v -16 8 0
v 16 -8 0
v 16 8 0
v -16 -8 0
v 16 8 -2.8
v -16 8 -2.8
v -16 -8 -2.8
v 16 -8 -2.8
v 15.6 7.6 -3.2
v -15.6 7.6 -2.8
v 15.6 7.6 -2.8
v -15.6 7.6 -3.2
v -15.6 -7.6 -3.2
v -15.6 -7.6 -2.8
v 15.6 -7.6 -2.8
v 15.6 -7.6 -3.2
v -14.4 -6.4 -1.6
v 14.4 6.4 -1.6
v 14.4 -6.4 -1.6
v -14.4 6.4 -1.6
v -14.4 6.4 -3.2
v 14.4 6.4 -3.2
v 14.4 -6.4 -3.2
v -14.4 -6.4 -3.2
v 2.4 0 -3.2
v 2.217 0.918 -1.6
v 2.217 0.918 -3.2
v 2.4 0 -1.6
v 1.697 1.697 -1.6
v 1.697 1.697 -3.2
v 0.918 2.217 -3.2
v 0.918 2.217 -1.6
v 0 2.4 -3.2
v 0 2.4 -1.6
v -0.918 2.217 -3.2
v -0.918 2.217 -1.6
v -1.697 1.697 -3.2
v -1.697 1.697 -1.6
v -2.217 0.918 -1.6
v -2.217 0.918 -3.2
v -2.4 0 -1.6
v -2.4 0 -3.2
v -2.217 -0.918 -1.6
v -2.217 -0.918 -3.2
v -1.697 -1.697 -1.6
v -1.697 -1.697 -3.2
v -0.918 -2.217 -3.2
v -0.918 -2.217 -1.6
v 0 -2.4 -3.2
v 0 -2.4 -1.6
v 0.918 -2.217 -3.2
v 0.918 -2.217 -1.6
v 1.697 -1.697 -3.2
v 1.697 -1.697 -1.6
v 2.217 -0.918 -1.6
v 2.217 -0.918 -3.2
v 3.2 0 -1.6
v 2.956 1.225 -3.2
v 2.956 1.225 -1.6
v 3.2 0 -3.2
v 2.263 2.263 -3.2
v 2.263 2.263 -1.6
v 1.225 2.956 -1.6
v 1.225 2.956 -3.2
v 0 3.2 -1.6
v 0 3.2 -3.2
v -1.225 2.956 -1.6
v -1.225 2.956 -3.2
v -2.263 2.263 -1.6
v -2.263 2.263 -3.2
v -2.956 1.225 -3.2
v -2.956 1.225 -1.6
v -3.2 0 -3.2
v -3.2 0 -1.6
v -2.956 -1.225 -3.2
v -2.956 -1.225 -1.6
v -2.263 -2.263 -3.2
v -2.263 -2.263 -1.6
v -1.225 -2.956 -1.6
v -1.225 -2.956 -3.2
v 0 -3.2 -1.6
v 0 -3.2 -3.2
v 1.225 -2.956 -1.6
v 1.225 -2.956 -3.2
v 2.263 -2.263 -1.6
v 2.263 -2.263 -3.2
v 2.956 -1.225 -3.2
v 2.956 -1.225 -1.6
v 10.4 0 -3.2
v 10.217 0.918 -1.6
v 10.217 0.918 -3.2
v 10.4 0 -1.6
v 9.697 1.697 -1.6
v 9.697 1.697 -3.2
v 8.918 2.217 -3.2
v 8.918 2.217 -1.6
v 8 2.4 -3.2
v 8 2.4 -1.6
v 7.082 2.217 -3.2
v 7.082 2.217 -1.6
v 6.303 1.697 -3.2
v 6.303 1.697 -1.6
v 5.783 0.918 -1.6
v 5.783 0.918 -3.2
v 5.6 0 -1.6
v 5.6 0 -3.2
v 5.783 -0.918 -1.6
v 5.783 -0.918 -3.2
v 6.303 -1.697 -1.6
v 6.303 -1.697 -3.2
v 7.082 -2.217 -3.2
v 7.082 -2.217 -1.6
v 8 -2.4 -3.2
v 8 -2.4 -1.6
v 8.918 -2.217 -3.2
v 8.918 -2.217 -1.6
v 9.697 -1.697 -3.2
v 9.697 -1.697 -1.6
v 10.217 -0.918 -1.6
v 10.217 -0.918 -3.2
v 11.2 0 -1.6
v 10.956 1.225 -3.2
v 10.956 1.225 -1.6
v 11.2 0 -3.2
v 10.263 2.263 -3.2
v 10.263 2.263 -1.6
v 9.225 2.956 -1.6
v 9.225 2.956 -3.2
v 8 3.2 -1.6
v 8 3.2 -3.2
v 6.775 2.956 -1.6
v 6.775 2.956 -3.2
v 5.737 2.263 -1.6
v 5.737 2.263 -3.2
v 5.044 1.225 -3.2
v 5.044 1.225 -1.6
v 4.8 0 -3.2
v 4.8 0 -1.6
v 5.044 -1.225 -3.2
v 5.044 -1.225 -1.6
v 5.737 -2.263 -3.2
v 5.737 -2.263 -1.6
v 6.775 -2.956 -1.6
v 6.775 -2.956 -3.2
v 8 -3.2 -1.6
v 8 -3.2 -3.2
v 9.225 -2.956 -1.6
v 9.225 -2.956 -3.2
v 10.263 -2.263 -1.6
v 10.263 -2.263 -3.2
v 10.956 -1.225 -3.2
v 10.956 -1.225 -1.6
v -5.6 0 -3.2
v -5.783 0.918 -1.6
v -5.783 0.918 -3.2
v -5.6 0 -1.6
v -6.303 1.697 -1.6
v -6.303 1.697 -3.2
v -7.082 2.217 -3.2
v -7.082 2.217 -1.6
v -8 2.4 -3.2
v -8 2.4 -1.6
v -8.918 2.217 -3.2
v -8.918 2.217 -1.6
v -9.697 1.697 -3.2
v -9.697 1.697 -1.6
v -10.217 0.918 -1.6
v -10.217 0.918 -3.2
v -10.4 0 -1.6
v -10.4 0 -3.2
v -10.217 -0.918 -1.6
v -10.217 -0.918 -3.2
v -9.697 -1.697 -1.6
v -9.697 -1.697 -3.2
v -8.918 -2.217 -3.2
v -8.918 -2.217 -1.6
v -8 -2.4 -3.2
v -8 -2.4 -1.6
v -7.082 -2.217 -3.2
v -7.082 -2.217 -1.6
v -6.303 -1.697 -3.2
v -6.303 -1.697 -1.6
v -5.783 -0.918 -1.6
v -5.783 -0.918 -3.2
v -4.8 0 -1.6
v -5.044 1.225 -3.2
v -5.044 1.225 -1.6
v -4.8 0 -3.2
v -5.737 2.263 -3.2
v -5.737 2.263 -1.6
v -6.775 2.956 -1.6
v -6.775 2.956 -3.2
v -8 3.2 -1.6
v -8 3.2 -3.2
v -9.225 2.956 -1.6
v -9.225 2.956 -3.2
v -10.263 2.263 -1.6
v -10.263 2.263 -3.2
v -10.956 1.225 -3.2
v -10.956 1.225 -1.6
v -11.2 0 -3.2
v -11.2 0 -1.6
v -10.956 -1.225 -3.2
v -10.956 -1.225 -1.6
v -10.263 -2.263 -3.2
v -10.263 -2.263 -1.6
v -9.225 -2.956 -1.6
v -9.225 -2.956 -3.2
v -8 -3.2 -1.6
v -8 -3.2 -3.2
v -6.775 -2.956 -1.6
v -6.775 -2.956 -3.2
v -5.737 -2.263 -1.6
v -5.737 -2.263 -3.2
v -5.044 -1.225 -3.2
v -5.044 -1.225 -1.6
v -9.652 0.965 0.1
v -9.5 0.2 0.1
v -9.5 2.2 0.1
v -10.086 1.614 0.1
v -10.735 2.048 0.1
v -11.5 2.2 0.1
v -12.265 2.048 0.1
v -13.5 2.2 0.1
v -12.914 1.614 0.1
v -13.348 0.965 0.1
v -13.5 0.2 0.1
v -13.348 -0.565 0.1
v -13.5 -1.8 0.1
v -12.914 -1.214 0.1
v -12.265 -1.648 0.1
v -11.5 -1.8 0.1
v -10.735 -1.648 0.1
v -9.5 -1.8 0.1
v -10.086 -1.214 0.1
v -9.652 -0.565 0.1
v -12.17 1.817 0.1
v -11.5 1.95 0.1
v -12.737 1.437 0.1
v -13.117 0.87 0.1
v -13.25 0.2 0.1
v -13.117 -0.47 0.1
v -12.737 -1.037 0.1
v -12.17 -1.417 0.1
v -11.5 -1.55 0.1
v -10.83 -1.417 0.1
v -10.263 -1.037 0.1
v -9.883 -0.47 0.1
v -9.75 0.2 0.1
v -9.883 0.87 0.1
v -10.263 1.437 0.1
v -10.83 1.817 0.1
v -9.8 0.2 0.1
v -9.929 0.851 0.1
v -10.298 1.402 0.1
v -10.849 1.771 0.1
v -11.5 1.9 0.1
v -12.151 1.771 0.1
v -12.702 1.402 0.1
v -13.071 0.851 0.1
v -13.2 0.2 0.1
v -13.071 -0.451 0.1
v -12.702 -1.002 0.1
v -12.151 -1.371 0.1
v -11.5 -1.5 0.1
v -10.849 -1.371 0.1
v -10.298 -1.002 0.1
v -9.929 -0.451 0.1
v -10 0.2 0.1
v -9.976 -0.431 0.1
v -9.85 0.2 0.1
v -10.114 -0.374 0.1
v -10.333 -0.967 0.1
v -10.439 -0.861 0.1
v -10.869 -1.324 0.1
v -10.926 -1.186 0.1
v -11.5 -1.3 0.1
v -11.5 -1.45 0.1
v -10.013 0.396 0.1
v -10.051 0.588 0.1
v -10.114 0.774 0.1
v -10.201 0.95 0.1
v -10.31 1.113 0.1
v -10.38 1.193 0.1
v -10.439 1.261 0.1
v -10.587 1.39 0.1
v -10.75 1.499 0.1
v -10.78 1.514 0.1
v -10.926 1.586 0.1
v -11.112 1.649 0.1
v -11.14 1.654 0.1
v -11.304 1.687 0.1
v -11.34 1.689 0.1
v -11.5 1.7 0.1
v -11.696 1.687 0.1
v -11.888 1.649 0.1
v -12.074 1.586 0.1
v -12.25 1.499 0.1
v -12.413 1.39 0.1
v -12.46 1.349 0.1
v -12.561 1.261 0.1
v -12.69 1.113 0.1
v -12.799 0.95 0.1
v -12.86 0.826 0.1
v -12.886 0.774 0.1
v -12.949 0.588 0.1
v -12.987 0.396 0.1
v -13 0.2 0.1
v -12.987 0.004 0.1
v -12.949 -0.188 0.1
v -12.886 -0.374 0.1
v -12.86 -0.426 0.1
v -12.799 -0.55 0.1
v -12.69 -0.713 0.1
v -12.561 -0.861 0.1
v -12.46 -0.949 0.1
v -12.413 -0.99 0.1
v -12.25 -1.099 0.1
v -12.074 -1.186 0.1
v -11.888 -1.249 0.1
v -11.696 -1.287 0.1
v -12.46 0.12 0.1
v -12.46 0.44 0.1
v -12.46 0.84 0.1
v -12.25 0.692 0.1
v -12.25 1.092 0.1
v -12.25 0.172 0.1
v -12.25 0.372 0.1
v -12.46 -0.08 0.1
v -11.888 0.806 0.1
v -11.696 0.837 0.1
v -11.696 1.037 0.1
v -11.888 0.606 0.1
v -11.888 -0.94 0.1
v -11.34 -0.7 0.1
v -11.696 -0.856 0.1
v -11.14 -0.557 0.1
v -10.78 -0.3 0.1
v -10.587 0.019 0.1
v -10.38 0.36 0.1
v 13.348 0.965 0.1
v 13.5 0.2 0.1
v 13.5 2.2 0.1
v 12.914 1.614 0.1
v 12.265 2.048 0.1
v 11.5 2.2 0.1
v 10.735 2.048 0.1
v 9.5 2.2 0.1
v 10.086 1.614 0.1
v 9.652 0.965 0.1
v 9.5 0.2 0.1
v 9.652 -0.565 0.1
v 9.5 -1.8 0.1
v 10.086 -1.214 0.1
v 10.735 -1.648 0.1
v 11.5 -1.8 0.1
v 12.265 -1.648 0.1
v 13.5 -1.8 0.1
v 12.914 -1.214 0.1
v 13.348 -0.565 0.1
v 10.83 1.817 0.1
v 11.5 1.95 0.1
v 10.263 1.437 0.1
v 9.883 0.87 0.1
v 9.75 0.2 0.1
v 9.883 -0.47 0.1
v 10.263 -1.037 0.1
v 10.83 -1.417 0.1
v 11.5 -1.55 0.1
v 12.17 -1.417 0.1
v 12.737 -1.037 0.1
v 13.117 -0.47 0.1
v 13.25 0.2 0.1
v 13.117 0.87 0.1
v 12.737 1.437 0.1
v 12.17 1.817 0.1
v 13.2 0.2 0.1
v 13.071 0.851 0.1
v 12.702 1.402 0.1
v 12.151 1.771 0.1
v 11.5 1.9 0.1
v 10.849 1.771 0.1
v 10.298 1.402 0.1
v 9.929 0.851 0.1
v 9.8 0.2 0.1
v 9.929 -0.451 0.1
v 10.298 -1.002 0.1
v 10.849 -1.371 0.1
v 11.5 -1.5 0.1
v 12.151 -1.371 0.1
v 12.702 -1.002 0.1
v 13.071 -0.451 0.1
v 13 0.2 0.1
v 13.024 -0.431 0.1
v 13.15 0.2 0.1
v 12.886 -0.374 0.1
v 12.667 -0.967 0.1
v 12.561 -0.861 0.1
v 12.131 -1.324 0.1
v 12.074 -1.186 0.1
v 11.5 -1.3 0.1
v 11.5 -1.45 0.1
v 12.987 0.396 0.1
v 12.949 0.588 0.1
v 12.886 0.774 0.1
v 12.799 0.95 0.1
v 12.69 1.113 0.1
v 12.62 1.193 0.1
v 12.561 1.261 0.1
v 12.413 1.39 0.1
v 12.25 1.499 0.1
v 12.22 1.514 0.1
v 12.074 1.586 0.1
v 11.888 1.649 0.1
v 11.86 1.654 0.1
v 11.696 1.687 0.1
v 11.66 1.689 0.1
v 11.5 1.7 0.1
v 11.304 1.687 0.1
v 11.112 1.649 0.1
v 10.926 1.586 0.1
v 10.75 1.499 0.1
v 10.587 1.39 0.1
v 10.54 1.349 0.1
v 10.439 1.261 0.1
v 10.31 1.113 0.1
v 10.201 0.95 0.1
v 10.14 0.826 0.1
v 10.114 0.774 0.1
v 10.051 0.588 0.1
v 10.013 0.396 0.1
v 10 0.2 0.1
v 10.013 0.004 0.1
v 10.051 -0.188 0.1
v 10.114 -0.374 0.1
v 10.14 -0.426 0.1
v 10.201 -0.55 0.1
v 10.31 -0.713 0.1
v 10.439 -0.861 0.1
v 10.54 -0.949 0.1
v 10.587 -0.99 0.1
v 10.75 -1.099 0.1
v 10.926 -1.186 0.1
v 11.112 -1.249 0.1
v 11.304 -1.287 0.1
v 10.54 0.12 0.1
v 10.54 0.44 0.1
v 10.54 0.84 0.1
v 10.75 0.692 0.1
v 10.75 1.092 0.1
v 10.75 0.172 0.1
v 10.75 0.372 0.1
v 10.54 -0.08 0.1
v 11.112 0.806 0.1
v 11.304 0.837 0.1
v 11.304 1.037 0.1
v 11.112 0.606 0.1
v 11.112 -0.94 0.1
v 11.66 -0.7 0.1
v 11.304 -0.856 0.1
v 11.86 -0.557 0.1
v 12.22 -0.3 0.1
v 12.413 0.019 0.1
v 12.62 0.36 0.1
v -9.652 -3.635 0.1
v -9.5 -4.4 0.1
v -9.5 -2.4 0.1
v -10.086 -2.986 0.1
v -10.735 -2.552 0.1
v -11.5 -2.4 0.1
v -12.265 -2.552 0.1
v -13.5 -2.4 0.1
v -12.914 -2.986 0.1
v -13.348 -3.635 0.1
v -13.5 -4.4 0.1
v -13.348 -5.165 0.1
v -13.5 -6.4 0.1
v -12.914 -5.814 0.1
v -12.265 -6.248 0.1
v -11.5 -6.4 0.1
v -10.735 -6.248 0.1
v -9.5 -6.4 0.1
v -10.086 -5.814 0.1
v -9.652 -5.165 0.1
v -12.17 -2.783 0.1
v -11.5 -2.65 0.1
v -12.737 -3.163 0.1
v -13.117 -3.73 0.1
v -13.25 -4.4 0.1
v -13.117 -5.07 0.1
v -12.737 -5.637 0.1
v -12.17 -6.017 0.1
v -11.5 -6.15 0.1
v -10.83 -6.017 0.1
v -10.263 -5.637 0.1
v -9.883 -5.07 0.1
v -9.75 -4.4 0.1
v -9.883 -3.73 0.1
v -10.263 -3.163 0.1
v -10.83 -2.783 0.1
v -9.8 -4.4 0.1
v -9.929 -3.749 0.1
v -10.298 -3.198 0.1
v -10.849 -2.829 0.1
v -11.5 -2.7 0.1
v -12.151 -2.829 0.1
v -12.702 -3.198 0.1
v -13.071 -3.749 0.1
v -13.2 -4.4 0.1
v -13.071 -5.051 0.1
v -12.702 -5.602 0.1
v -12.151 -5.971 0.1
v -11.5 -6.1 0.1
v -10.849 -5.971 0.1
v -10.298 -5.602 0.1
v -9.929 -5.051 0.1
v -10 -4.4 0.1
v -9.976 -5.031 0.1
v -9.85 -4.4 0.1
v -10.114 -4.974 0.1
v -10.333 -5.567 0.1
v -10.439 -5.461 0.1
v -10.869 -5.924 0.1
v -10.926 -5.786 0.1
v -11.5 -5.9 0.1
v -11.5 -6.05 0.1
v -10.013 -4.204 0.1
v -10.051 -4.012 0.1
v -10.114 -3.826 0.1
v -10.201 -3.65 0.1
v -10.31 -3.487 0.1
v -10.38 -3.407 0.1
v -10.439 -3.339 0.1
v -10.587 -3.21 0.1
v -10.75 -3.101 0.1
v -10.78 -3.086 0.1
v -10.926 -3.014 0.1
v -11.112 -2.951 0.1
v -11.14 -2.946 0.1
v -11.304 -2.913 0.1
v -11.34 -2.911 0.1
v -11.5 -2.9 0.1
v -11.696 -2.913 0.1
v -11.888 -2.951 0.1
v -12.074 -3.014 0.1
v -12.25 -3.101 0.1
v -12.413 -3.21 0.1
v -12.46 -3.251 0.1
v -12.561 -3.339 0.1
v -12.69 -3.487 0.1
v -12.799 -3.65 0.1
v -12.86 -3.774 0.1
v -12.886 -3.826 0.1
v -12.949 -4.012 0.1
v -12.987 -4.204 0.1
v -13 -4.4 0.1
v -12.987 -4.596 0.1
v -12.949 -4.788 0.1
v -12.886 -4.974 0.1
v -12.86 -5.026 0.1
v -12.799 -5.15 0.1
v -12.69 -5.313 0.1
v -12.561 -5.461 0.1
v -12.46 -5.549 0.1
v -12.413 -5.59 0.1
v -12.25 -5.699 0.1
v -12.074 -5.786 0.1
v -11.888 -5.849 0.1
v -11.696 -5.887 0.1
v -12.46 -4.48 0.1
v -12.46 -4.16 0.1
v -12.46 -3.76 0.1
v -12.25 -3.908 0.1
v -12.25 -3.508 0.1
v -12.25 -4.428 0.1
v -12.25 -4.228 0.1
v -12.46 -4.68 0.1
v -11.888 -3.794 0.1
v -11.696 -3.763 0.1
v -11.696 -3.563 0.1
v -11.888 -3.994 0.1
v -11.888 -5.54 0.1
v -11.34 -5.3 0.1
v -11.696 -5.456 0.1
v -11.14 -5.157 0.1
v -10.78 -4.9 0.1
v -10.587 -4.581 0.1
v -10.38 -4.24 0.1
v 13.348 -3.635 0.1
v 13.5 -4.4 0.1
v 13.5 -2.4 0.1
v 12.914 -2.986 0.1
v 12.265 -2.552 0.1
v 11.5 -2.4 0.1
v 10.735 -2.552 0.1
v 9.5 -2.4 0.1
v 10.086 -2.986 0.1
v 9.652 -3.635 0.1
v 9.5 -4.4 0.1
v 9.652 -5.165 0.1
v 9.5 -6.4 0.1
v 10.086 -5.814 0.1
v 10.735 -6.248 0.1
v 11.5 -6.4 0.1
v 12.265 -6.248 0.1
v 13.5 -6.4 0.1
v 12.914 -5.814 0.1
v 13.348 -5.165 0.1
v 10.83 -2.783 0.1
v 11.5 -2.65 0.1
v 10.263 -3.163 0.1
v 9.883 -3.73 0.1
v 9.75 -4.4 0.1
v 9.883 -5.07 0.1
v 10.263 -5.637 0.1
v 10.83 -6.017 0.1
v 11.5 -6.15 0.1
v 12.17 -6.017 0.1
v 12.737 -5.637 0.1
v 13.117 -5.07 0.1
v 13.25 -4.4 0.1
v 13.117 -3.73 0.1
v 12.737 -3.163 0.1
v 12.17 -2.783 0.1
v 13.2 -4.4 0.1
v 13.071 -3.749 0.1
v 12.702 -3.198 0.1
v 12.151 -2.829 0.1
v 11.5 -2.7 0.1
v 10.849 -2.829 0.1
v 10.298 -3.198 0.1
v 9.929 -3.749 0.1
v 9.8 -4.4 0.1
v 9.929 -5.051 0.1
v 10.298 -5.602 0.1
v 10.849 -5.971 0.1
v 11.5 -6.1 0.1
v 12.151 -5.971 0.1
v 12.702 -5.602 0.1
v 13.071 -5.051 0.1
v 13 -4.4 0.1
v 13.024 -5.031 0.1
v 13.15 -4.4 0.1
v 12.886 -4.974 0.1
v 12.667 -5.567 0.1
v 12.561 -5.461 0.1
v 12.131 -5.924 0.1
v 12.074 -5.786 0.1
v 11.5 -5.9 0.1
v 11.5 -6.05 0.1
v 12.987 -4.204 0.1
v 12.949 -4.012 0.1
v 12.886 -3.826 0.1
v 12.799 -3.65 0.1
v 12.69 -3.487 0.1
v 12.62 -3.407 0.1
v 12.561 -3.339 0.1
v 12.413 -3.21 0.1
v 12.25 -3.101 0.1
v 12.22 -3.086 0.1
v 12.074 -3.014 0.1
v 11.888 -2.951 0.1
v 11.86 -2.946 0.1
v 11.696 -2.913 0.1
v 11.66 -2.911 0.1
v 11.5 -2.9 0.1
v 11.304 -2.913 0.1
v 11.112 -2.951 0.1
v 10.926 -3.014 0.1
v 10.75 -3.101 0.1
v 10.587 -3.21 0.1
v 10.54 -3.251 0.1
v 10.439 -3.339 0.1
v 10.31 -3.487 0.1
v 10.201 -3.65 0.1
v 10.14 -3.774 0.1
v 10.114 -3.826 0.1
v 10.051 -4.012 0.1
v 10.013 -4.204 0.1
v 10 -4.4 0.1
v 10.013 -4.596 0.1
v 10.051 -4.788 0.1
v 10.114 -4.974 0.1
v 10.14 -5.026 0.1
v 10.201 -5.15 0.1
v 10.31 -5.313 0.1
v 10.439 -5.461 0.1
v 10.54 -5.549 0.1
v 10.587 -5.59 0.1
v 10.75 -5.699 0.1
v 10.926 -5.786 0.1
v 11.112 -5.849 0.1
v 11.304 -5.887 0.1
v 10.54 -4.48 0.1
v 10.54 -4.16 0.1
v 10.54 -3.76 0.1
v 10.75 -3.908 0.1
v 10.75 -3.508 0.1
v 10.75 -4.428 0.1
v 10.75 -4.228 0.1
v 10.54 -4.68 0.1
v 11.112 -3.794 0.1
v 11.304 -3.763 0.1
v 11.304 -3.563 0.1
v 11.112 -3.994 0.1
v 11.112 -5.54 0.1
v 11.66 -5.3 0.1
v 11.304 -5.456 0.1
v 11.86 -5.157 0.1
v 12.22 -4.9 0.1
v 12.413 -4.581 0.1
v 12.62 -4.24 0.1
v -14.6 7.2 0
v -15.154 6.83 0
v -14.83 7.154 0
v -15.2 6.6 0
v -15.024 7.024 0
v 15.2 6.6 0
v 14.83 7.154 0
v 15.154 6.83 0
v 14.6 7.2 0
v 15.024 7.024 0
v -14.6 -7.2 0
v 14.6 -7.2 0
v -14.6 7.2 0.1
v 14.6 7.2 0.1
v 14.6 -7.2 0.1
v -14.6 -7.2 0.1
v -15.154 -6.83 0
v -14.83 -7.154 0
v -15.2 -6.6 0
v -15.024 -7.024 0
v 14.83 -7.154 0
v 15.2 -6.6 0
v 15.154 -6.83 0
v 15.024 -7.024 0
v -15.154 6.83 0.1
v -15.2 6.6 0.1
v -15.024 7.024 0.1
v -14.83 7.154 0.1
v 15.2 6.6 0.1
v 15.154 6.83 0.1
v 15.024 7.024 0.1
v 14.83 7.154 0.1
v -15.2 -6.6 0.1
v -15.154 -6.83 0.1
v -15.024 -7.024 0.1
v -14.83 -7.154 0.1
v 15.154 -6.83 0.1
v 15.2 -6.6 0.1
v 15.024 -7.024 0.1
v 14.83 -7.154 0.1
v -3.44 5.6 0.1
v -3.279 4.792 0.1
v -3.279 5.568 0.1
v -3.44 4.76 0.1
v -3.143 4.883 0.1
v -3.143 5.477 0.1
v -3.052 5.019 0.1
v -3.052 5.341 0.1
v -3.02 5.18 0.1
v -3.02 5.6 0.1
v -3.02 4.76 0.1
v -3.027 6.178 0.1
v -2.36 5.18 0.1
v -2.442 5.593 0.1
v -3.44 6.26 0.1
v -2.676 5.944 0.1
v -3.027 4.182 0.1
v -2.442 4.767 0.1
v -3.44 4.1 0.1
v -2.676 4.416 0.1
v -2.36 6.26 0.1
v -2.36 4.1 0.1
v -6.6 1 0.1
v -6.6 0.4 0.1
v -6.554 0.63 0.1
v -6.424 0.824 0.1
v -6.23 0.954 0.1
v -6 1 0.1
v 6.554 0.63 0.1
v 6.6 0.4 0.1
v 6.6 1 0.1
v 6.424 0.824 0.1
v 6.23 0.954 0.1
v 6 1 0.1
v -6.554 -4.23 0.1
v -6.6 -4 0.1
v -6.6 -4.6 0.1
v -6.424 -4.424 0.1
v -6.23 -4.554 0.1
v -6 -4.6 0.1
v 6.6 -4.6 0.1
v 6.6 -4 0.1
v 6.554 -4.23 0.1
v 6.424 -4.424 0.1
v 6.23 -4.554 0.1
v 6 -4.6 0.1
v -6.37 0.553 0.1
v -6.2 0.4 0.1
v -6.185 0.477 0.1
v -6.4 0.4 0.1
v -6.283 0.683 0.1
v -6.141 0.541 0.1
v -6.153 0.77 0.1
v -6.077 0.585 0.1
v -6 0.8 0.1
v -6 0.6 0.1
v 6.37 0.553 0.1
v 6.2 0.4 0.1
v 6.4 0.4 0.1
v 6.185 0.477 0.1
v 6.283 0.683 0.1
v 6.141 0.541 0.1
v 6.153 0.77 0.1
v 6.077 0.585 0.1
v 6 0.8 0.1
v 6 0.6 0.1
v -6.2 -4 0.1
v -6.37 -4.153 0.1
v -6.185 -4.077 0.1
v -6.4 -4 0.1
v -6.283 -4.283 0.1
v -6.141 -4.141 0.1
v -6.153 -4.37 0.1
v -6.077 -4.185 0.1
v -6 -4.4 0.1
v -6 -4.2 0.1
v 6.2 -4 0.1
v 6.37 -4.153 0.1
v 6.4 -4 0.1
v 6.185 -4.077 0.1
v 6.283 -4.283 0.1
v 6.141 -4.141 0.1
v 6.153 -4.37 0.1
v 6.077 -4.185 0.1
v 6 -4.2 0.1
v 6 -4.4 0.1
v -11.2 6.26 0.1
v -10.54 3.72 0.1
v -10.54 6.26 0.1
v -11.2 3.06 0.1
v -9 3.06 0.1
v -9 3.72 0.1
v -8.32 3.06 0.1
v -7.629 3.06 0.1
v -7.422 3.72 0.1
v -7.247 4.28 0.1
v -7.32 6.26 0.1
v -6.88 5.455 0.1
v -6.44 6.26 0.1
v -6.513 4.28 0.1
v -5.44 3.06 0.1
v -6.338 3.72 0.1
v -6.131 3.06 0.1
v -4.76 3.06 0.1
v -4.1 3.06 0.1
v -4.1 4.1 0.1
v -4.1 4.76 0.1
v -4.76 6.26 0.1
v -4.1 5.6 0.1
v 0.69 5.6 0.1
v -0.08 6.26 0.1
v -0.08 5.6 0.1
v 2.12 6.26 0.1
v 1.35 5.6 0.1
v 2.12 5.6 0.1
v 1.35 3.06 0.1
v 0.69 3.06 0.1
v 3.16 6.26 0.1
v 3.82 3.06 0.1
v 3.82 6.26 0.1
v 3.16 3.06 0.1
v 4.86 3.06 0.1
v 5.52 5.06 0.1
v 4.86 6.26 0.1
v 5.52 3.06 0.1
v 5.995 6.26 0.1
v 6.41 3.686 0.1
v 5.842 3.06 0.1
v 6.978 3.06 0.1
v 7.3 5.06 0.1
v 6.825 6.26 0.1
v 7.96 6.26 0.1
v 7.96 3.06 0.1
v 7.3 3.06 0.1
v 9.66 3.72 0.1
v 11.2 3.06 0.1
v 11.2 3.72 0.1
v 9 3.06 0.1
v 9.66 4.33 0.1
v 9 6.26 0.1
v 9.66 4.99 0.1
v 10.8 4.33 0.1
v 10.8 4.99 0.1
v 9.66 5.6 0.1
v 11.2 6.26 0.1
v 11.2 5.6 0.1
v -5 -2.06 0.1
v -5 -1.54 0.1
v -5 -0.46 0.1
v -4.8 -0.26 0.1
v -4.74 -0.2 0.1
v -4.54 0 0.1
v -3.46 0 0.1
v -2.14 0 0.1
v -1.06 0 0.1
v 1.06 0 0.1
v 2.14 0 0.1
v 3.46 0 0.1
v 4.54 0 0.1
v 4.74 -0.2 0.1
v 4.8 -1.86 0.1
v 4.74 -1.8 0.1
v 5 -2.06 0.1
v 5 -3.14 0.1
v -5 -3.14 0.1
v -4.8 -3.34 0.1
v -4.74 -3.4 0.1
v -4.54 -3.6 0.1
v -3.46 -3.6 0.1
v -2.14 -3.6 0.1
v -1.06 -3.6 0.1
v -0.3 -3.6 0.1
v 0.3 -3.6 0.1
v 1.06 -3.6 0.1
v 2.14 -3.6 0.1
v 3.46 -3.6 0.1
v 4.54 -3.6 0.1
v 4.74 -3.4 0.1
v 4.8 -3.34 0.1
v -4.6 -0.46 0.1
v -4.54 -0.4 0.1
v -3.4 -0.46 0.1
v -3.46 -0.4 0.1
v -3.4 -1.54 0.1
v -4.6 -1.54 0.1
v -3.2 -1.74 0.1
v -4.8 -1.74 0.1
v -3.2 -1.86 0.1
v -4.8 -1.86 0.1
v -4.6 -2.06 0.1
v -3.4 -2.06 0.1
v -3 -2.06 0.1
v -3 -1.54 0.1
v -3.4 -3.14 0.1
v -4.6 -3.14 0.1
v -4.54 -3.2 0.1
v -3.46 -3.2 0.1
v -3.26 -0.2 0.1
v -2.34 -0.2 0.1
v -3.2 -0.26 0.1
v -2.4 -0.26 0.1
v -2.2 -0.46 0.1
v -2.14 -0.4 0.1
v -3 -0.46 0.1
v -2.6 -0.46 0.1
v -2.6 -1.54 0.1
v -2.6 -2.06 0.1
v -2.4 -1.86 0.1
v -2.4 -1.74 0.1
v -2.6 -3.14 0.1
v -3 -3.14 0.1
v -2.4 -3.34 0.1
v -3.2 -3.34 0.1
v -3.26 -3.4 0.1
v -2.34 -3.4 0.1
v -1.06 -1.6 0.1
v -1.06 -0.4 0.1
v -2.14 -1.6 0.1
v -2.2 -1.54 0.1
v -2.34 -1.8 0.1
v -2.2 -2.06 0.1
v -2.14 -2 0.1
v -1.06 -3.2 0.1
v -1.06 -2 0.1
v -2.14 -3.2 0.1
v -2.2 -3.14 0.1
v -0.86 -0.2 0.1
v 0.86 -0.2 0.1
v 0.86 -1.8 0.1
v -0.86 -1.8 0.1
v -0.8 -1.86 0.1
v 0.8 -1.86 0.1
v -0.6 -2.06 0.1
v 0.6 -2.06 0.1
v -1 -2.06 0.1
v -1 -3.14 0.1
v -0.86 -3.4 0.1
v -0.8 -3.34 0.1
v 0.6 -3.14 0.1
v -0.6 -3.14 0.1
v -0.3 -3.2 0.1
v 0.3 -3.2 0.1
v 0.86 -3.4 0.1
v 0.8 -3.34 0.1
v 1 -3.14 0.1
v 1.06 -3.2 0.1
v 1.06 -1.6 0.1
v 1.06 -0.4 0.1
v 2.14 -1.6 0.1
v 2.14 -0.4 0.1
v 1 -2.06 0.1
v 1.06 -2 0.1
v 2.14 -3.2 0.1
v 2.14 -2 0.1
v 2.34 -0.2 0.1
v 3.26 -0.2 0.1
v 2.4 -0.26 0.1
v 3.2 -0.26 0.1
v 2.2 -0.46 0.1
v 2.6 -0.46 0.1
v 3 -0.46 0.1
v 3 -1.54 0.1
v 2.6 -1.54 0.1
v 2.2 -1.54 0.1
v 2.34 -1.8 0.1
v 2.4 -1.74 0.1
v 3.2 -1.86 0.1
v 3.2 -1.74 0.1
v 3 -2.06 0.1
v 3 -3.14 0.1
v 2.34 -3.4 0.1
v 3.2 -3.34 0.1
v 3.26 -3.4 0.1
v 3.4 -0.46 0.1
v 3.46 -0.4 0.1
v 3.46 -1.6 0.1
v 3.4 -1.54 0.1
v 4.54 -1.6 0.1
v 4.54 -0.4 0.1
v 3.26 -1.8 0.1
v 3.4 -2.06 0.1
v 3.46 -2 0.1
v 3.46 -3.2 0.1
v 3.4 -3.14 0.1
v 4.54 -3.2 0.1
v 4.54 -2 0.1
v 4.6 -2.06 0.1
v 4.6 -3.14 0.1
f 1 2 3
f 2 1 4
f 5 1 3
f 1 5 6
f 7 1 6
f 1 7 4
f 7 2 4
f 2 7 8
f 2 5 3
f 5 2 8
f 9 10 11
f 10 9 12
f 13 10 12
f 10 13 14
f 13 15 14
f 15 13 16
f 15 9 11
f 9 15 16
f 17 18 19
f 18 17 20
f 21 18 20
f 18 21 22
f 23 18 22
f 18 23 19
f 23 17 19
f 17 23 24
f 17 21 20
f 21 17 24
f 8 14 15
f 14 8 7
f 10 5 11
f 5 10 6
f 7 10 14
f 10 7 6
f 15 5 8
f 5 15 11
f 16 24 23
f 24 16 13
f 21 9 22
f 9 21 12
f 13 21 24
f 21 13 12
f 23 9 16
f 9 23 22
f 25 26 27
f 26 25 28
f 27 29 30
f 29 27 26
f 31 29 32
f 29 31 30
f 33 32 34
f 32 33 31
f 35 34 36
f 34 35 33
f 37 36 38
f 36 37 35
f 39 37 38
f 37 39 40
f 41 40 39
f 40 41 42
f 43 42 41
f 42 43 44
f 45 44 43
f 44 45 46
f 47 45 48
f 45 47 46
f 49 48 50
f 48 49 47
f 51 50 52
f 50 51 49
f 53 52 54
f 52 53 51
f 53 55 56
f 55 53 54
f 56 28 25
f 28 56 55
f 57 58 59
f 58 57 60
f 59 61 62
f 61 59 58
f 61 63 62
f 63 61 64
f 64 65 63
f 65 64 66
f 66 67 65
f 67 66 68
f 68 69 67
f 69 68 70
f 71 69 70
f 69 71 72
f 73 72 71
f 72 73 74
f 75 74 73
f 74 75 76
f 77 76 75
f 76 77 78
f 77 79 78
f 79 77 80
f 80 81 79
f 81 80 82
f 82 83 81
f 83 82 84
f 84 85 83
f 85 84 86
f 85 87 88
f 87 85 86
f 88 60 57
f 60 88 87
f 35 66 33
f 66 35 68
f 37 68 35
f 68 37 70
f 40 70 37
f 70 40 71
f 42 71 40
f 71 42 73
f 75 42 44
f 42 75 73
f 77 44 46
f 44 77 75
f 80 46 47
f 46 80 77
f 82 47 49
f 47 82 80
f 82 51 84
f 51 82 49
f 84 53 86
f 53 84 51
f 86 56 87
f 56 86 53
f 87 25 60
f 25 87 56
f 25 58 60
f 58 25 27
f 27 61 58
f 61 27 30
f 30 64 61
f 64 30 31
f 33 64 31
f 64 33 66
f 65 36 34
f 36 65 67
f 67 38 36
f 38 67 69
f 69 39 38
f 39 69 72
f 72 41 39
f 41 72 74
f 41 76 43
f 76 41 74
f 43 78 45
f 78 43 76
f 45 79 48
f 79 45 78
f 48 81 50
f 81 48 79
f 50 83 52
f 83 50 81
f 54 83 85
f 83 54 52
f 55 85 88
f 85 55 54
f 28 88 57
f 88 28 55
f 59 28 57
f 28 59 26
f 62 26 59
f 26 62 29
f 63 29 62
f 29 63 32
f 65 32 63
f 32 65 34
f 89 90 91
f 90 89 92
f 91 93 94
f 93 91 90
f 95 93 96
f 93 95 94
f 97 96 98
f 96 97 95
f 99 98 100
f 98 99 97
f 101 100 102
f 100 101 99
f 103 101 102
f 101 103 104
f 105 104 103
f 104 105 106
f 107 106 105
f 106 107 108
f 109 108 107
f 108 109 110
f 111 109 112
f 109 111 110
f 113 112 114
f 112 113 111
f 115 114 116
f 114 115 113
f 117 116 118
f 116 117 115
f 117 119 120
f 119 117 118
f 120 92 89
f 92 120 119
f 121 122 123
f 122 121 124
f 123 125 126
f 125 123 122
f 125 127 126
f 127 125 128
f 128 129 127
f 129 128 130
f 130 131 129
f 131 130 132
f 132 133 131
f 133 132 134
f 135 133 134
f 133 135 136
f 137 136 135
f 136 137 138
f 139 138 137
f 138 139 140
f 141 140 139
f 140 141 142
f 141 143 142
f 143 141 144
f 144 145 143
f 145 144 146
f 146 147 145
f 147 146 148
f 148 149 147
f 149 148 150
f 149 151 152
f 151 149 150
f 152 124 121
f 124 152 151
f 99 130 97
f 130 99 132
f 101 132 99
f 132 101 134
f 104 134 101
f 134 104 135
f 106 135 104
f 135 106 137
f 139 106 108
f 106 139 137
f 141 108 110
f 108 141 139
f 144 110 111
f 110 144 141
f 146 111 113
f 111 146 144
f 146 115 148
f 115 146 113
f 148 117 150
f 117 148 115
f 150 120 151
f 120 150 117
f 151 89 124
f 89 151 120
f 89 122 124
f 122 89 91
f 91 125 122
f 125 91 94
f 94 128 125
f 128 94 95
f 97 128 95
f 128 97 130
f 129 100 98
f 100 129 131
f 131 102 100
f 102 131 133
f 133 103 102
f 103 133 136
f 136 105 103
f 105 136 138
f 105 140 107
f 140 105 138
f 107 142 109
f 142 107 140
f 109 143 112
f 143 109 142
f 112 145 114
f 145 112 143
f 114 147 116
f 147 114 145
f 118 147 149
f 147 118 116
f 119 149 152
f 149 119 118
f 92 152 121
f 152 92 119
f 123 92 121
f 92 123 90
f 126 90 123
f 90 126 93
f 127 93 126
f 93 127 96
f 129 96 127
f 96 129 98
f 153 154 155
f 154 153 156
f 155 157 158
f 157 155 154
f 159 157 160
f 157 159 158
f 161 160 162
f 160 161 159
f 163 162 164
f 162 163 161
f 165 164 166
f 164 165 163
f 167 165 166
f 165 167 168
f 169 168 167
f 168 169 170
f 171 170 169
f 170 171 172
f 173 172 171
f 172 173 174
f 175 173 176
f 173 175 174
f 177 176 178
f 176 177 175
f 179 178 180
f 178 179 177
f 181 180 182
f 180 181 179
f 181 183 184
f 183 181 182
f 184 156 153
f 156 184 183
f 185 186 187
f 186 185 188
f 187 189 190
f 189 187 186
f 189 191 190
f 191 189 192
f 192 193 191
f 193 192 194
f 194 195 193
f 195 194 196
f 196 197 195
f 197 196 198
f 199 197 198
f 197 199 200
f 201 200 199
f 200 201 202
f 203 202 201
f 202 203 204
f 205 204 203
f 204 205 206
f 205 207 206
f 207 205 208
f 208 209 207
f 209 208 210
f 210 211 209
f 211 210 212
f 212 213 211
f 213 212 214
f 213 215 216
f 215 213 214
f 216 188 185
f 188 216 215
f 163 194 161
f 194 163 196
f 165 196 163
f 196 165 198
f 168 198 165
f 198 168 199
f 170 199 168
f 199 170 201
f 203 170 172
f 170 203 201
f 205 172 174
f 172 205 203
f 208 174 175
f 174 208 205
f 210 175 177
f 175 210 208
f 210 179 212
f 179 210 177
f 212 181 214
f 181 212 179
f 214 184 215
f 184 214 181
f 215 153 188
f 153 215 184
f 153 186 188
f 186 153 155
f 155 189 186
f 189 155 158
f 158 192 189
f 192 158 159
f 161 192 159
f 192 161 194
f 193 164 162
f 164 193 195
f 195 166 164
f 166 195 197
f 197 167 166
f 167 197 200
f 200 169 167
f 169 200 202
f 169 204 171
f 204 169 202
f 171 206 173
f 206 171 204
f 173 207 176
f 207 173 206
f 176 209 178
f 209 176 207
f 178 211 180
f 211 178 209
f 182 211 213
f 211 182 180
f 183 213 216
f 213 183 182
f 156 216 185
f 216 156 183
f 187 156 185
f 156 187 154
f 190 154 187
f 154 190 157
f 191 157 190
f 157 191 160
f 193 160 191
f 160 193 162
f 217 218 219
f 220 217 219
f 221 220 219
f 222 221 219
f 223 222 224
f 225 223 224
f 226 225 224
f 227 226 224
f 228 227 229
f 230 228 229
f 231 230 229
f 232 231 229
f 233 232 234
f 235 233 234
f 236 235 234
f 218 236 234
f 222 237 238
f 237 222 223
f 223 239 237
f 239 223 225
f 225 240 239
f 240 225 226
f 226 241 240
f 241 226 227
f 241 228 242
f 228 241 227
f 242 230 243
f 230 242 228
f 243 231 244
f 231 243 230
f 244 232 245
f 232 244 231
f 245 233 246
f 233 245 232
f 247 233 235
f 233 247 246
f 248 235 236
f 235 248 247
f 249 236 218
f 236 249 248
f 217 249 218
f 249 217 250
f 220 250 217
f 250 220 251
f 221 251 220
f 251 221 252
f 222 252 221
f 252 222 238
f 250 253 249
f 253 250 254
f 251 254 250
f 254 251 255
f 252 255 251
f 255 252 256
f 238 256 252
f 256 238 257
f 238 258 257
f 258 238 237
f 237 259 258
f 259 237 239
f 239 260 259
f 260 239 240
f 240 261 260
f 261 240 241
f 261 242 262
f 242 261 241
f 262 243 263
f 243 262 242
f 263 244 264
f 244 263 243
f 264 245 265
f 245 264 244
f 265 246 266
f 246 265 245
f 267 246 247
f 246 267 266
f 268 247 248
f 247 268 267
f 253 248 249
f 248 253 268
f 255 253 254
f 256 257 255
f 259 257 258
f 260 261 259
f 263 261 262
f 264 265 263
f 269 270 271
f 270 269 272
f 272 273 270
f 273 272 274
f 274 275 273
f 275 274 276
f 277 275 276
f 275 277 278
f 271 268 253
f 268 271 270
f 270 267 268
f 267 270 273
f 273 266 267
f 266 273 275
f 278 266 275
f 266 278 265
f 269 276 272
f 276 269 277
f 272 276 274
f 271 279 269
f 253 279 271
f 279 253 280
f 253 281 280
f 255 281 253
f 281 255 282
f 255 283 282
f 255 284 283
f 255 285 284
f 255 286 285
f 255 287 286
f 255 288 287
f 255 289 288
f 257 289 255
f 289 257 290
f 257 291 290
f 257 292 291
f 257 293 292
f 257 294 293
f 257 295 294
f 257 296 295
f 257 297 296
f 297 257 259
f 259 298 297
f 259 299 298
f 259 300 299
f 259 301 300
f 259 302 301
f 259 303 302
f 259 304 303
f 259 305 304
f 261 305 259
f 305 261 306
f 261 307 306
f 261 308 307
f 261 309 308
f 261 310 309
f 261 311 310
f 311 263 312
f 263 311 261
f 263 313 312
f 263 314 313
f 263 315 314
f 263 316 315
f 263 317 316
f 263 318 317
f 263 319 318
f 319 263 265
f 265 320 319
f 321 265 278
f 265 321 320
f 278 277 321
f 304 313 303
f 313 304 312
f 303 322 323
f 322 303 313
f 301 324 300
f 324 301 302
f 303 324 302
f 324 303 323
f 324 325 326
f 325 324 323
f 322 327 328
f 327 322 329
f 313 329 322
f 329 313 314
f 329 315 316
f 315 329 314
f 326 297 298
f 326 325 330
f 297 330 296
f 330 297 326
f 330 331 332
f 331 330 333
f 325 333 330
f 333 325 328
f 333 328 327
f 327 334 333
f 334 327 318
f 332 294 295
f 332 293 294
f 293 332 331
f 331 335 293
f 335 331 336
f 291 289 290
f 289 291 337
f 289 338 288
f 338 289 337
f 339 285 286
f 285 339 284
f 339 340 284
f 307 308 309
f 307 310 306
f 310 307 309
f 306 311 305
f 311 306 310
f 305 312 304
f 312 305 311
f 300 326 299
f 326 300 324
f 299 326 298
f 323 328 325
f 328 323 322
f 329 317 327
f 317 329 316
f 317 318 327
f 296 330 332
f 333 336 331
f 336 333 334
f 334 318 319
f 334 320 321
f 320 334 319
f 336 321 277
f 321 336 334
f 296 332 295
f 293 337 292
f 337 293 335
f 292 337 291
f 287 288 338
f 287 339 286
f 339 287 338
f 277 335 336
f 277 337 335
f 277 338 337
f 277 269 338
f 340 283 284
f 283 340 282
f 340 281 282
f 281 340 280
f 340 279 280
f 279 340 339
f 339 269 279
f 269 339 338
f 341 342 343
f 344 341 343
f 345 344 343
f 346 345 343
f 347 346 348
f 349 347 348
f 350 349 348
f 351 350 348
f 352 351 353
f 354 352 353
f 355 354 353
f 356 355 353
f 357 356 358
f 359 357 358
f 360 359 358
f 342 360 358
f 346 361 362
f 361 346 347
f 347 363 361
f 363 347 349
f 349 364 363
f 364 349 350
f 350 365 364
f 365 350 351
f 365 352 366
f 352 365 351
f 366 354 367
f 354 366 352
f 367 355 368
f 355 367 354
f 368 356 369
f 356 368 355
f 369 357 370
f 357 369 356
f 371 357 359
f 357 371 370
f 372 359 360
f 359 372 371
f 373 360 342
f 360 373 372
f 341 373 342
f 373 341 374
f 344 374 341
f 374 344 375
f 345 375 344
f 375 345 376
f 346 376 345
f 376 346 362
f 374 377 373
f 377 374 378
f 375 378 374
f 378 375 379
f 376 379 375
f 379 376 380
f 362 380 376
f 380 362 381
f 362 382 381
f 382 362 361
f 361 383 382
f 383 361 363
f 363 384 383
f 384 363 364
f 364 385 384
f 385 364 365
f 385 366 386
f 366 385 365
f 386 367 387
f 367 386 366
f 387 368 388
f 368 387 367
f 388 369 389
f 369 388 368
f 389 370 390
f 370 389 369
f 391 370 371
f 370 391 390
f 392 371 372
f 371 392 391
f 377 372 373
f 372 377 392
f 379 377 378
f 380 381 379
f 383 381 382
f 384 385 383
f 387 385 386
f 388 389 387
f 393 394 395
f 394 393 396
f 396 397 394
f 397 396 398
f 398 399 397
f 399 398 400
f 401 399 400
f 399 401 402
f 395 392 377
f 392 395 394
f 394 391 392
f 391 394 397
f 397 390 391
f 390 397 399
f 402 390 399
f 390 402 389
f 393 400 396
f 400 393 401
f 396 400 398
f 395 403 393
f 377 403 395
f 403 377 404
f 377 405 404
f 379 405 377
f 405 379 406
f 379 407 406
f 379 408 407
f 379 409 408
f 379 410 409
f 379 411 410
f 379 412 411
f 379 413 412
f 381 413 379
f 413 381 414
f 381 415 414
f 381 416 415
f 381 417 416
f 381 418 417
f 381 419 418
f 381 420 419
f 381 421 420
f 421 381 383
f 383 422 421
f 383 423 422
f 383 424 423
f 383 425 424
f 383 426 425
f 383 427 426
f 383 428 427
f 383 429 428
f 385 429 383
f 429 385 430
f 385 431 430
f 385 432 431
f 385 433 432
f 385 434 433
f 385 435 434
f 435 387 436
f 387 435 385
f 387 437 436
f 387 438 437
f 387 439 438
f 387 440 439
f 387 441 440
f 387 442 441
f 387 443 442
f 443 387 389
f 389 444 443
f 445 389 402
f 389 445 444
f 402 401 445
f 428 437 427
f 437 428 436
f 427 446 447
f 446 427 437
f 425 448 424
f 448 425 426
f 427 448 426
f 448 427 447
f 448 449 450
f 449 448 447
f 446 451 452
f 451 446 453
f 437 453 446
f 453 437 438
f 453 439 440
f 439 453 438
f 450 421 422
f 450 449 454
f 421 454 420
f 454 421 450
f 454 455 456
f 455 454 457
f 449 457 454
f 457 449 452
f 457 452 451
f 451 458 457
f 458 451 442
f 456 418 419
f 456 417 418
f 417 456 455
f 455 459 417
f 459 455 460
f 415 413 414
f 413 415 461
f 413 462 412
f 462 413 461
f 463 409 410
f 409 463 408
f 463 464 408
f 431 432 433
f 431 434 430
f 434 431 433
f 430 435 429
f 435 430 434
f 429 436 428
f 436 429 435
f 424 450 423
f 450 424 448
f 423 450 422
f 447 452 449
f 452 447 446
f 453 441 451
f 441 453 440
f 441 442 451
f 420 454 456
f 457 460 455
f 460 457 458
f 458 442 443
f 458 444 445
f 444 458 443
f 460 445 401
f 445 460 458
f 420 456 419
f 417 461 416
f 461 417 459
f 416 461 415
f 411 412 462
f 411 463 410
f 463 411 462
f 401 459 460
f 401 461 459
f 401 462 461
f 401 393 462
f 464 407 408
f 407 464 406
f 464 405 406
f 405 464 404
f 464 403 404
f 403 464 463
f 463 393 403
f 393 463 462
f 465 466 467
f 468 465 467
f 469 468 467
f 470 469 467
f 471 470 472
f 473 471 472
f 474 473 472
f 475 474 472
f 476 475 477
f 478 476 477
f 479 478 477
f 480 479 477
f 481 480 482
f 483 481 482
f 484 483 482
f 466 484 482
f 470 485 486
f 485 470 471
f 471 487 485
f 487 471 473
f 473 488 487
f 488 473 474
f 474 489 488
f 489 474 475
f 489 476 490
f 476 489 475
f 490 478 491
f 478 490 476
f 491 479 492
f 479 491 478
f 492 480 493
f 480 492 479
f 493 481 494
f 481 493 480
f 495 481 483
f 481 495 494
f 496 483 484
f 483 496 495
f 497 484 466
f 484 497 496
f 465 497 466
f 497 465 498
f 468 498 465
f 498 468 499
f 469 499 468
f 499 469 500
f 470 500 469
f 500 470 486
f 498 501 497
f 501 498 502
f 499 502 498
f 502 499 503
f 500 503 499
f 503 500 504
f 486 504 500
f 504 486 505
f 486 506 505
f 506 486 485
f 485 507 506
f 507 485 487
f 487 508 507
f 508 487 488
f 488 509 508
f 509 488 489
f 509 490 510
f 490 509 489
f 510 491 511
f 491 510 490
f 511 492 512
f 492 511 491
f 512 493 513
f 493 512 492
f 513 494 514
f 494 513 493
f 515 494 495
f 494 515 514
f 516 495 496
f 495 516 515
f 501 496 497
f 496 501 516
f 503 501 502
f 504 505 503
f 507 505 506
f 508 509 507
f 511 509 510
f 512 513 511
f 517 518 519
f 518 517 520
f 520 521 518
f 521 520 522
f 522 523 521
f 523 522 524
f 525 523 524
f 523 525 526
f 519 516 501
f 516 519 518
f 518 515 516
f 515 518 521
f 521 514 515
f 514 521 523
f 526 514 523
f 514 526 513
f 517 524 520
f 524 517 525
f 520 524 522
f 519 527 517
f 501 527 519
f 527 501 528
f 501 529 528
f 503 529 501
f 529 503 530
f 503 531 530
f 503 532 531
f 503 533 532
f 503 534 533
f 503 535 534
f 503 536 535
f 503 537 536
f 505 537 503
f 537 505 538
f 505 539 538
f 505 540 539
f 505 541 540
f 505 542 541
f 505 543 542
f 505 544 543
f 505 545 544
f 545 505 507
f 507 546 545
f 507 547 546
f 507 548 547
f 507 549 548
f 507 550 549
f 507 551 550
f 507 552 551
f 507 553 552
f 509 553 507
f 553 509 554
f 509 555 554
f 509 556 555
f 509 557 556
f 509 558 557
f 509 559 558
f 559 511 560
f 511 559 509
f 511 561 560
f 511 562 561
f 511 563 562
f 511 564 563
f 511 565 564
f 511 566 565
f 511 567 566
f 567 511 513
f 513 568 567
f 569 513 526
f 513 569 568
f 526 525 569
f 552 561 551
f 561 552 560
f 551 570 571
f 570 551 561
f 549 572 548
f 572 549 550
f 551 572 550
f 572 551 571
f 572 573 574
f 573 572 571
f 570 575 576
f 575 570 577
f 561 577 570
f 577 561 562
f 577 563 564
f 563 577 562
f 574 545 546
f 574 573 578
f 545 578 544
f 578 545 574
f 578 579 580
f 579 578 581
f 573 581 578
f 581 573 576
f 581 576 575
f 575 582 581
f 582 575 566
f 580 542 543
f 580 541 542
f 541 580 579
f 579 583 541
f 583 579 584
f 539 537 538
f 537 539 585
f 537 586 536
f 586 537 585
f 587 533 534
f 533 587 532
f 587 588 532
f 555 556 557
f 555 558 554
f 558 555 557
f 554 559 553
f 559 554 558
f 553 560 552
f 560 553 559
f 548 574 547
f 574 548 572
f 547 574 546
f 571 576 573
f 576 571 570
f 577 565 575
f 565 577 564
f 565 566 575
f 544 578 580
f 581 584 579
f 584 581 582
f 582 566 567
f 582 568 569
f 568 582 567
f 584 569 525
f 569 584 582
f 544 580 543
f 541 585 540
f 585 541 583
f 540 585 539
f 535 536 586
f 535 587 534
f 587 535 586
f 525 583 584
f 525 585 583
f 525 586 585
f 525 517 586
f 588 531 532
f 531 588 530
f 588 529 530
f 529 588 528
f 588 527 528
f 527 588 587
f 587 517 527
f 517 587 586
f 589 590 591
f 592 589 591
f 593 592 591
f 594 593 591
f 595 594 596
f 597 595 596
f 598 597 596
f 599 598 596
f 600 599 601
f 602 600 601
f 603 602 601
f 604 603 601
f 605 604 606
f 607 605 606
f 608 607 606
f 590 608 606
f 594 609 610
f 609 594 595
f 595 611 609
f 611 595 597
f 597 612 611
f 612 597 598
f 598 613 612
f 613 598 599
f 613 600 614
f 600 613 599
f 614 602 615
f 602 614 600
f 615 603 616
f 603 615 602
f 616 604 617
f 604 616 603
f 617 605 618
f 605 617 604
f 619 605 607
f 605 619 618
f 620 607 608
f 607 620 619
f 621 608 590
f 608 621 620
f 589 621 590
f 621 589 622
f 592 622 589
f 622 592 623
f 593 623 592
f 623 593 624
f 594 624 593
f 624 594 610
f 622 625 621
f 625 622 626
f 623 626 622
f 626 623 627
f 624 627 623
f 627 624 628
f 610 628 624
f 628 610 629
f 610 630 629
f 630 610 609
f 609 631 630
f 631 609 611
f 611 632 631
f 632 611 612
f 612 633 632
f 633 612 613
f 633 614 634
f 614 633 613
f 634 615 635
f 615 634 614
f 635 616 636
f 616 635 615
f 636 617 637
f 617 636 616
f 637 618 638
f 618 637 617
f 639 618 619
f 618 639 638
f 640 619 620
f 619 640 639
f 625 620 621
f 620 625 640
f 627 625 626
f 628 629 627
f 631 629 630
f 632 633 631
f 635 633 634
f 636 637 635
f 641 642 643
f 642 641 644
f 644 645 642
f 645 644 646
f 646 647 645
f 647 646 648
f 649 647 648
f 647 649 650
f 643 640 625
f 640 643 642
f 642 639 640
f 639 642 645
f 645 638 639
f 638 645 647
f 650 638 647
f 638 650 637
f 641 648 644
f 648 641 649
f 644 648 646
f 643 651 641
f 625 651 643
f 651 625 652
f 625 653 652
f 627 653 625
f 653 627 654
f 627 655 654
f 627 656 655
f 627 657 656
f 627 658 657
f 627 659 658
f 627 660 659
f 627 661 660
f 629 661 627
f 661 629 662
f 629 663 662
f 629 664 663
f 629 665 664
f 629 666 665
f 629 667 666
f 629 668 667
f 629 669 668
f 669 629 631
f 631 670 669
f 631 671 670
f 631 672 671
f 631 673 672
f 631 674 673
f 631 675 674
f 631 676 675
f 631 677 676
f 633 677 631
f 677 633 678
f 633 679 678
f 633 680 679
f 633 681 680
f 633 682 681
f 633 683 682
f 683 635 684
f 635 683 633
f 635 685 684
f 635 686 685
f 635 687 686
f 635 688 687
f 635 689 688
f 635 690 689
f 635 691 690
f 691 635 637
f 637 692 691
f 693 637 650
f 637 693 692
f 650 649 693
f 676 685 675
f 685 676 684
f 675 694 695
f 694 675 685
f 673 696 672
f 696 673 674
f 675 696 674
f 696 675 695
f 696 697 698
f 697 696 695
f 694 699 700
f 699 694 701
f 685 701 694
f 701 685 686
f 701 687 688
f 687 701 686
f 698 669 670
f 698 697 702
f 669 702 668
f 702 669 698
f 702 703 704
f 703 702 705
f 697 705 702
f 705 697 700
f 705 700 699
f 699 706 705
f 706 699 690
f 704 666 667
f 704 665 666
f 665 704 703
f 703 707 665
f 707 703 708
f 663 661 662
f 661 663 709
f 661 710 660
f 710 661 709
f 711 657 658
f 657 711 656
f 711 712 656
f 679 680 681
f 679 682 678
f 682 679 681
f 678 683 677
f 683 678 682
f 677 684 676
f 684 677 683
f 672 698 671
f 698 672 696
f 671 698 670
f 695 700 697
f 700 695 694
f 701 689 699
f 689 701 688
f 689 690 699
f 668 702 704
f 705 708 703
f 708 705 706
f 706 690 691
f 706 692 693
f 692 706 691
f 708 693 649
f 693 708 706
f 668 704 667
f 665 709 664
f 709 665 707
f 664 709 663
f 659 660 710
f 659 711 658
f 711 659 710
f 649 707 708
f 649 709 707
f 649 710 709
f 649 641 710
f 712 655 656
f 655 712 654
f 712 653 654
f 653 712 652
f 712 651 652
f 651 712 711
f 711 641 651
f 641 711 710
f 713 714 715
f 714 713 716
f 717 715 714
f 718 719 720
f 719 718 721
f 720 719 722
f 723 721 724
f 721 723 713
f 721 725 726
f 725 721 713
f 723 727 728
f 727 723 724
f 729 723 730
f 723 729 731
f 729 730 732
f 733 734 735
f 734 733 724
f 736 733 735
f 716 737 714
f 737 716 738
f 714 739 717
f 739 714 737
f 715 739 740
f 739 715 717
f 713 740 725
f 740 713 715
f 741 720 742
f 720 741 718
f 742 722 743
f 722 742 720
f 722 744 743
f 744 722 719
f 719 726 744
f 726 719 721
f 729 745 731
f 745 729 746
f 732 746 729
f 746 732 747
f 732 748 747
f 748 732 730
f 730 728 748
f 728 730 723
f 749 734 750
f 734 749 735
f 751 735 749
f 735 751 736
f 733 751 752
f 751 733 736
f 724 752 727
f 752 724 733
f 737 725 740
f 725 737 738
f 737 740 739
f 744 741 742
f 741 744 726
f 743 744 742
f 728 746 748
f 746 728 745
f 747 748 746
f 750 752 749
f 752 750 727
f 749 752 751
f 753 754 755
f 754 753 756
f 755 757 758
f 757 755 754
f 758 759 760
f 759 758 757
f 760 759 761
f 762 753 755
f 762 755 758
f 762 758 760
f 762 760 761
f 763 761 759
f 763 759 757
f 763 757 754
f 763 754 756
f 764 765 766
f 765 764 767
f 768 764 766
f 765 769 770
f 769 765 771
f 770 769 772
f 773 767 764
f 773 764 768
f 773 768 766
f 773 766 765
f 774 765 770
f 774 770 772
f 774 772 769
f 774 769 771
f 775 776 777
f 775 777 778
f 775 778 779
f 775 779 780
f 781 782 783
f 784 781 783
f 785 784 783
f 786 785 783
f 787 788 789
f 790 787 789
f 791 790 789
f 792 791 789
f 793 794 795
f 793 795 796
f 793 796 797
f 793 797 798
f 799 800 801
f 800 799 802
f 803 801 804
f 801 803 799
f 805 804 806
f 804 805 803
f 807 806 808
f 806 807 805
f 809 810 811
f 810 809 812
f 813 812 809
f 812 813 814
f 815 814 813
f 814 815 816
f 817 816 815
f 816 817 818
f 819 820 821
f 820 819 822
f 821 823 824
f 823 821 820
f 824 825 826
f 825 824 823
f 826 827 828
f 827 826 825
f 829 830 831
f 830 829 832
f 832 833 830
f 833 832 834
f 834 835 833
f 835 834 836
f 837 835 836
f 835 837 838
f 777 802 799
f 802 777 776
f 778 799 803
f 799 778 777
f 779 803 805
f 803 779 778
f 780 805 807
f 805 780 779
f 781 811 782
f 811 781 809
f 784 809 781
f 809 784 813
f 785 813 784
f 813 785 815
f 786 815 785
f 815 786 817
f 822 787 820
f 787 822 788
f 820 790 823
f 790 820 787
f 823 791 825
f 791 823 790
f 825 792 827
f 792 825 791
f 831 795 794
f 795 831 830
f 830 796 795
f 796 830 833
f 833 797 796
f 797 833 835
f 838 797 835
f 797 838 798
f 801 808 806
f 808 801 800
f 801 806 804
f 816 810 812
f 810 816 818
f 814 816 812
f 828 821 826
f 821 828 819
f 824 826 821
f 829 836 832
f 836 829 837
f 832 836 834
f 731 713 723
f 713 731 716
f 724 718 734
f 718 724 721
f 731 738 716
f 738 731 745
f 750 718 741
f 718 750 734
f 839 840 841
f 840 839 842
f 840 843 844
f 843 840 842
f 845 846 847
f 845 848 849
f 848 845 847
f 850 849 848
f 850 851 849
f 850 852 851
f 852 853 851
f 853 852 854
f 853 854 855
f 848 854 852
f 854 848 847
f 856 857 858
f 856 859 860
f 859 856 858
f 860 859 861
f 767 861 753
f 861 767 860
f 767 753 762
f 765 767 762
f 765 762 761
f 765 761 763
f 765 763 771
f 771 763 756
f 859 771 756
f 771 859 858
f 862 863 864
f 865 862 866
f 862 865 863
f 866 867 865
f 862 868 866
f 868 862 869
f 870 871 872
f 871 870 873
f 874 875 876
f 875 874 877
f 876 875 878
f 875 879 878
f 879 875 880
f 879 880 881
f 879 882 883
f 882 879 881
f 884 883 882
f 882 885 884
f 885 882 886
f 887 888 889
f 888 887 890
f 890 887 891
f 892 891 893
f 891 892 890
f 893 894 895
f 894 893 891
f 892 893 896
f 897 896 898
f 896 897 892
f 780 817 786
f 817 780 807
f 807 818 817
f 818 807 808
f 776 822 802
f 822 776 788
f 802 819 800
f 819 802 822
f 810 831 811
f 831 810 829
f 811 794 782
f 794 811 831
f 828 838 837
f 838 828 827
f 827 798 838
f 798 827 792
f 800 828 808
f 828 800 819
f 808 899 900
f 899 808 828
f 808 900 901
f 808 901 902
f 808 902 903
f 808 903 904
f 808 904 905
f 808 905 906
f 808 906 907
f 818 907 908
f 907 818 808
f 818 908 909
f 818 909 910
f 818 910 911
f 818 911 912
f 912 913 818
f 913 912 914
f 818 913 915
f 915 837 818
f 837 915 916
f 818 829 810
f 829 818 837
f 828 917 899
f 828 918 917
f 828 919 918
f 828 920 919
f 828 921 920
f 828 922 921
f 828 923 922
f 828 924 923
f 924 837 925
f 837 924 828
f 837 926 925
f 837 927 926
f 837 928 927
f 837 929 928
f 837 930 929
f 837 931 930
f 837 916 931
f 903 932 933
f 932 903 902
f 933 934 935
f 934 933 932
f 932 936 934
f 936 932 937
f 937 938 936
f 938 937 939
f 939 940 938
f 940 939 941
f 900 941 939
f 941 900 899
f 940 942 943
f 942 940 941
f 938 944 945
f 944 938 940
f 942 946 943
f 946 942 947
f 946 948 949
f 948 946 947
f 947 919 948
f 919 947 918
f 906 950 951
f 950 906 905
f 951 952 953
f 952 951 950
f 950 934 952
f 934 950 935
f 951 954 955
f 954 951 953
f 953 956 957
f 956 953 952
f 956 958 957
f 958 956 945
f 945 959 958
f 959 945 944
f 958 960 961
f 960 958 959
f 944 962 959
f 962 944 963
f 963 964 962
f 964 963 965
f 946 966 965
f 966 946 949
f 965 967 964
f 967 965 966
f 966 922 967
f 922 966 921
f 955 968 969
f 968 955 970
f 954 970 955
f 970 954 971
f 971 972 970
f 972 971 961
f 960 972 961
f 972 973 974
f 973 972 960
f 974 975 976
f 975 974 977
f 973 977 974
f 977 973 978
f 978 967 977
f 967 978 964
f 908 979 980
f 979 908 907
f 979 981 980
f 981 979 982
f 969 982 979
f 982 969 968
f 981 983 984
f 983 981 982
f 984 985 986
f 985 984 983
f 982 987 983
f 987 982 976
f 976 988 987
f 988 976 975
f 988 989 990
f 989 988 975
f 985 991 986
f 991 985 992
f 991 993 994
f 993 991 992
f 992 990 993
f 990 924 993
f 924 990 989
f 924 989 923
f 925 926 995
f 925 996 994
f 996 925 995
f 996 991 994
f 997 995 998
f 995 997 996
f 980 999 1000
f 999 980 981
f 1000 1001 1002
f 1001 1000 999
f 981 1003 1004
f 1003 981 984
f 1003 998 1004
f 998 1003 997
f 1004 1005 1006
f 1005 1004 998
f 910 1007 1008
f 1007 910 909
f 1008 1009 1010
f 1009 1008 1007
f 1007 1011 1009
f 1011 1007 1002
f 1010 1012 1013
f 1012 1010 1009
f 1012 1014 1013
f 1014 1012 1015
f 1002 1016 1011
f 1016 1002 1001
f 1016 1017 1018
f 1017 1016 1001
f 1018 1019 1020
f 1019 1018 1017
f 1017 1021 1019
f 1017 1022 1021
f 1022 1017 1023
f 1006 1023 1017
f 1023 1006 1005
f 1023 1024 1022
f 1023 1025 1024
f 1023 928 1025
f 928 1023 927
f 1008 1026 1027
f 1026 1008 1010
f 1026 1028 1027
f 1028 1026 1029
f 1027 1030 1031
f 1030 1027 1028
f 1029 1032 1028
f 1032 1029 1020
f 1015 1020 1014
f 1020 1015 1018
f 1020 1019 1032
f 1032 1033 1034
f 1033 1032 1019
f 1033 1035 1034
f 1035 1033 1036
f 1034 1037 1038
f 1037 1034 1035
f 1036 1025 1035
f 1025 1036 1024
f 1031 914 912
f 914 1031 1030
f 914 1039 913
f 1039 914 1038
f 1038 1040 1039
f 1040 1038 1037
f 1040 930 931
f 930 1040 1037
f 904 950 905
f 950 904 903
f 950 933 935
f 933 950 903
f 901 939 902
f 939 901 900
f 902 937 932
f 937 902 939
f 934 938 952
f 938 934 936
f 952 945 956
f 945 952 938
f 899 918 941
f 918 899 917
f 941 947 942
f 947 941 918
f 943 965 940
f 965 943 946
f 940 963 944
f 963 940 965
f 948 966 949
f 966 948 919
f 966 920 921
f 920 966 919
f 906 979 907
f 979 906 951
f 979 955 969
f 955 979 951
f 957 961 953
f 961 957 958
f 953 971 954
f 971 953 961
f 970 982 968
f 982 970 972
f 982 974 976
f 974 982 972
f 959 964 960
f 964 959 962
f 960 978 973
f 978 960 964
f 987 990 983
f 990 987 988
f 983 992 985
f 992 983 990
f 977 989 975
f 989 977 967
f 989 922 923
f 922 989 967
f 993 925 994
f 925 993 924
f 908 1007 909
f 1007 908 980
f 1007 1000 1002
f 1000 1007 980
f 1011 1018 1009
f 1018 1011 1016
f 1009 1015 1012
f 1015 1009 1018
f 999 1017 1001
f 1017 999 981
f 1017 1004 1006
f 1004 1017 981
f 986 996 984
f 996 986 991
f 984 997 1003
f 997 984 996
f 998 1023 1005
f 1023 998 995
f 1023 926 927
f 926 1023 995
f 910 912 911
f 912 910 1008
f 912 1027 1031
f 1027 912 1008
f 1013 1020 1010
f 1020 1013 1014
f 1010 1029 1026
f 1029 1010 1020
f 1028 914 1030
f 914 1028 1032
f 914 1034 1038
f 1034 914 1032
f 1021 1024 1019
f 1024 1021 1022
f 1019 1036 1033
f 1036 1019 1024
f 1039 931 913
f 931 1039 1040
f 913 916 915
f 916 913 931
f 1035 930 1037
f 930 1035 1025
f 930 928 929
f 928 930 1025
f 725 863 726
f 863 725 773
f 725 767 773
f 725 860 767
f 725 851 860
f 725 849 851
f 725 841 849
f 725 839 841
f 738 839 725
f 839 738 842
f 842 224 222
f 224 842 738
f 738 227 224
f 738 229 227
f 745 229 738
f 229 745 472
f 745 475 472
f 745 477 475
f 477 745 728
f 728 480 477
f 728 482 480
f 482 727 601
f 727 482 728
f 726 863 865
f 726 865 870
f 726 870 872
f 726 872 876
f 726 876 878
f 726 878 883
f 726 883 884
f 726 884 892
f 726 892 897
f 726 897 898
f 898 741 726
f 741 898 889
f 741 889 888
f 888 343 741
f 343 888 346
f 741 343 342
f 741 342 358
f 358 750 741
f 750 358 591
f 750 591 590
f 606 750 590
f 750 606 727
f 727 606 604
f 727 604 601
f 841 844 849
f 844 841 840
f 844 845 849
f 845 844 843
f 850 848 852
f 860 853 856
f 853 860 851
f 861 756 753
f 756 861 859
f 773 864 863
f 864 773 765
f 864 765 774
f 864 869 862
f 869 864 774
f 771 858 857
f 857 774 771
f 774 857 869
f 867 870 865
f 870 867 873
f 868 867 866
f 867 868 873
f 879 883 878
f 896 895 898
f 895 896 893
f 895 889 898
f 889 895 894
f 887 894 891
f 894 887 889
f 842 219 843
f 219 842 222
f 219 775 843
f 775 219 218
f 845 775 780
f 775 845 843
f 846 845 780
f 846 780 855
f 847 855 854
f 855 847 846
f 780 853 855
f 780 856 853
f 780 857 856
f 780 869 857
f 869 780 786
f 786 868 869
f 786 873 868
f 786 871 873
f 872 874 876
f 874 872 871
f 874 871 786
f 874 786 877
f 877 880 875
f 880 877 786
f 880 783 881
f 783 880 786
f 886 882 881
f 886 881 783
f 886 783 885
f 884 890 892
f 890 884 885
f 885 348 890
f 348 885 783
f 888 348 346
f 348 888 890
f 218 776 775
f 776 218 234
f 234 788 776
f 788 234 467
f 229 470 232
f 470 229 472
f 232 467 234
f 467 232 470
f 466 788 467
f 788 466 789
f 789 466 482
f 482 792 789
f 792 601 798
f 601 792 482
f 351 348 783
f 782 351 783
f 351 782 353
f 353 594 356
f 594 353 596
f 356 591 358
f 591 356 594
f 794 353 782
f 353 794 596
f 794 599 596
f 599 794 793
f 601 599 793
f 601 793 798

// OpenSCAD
use <../lib.scad>
use <6141955a.scad>
use <87079.scad>
function ldraw_lib__87079d1p() = [
// 0 Tile  2 x  4 with "Lap Time 06.26" and 4 Orange Lights on Black Background Sticker
// 0 Name: 87079d1p.dat
// 0 Author: Alfred Schmitz [AlfredS]
// 0 !LDRAW_ORG Shortcut UPDATE 2026-09
// 0 !LICENSE Licensed under CC BY 4.0 : see CAreadme.txt
// 
// 0 BFC CERTIFY CCW
  [0,"BFC","CERTIFY"],
  [0,"BFC","CCW"],
// 
// 0 !CATEGORY Sticker Shortcut
// 0 !KEYWORDS Ford, GT, Mustang, Set 75871, Speed Champions
// 
// 0 !HISTORY 2026-09-30 [OrionP] Official Update 2026-09
// 
// 1 16 0 0 0 1 0 0 0 1 0 0 0 1 87079.dat
  [1,16,0,0,0,1,0,0,0,1,0,0,0,1, ldraw_lib__87079()],
// 1 16 0 0 0 1 0 0 0 1 0 0 0 1 6141955a.dat
  [1,16,0,0,0,1,0,0,0,1,0,0,0,1, ldraw_lib__6141955a()],
];
module ldraw_lib__87079d1p(step=0, col=false, unit=2/5, alt=false, line=0.2, solid=!$preview)
    makepoly(ldraw_lib__87079d1p(), step=step, col=col, unit=unit, alt=alt, line=line, solid=solid);
ldraw_lib__87079d1p(line=0.2);
